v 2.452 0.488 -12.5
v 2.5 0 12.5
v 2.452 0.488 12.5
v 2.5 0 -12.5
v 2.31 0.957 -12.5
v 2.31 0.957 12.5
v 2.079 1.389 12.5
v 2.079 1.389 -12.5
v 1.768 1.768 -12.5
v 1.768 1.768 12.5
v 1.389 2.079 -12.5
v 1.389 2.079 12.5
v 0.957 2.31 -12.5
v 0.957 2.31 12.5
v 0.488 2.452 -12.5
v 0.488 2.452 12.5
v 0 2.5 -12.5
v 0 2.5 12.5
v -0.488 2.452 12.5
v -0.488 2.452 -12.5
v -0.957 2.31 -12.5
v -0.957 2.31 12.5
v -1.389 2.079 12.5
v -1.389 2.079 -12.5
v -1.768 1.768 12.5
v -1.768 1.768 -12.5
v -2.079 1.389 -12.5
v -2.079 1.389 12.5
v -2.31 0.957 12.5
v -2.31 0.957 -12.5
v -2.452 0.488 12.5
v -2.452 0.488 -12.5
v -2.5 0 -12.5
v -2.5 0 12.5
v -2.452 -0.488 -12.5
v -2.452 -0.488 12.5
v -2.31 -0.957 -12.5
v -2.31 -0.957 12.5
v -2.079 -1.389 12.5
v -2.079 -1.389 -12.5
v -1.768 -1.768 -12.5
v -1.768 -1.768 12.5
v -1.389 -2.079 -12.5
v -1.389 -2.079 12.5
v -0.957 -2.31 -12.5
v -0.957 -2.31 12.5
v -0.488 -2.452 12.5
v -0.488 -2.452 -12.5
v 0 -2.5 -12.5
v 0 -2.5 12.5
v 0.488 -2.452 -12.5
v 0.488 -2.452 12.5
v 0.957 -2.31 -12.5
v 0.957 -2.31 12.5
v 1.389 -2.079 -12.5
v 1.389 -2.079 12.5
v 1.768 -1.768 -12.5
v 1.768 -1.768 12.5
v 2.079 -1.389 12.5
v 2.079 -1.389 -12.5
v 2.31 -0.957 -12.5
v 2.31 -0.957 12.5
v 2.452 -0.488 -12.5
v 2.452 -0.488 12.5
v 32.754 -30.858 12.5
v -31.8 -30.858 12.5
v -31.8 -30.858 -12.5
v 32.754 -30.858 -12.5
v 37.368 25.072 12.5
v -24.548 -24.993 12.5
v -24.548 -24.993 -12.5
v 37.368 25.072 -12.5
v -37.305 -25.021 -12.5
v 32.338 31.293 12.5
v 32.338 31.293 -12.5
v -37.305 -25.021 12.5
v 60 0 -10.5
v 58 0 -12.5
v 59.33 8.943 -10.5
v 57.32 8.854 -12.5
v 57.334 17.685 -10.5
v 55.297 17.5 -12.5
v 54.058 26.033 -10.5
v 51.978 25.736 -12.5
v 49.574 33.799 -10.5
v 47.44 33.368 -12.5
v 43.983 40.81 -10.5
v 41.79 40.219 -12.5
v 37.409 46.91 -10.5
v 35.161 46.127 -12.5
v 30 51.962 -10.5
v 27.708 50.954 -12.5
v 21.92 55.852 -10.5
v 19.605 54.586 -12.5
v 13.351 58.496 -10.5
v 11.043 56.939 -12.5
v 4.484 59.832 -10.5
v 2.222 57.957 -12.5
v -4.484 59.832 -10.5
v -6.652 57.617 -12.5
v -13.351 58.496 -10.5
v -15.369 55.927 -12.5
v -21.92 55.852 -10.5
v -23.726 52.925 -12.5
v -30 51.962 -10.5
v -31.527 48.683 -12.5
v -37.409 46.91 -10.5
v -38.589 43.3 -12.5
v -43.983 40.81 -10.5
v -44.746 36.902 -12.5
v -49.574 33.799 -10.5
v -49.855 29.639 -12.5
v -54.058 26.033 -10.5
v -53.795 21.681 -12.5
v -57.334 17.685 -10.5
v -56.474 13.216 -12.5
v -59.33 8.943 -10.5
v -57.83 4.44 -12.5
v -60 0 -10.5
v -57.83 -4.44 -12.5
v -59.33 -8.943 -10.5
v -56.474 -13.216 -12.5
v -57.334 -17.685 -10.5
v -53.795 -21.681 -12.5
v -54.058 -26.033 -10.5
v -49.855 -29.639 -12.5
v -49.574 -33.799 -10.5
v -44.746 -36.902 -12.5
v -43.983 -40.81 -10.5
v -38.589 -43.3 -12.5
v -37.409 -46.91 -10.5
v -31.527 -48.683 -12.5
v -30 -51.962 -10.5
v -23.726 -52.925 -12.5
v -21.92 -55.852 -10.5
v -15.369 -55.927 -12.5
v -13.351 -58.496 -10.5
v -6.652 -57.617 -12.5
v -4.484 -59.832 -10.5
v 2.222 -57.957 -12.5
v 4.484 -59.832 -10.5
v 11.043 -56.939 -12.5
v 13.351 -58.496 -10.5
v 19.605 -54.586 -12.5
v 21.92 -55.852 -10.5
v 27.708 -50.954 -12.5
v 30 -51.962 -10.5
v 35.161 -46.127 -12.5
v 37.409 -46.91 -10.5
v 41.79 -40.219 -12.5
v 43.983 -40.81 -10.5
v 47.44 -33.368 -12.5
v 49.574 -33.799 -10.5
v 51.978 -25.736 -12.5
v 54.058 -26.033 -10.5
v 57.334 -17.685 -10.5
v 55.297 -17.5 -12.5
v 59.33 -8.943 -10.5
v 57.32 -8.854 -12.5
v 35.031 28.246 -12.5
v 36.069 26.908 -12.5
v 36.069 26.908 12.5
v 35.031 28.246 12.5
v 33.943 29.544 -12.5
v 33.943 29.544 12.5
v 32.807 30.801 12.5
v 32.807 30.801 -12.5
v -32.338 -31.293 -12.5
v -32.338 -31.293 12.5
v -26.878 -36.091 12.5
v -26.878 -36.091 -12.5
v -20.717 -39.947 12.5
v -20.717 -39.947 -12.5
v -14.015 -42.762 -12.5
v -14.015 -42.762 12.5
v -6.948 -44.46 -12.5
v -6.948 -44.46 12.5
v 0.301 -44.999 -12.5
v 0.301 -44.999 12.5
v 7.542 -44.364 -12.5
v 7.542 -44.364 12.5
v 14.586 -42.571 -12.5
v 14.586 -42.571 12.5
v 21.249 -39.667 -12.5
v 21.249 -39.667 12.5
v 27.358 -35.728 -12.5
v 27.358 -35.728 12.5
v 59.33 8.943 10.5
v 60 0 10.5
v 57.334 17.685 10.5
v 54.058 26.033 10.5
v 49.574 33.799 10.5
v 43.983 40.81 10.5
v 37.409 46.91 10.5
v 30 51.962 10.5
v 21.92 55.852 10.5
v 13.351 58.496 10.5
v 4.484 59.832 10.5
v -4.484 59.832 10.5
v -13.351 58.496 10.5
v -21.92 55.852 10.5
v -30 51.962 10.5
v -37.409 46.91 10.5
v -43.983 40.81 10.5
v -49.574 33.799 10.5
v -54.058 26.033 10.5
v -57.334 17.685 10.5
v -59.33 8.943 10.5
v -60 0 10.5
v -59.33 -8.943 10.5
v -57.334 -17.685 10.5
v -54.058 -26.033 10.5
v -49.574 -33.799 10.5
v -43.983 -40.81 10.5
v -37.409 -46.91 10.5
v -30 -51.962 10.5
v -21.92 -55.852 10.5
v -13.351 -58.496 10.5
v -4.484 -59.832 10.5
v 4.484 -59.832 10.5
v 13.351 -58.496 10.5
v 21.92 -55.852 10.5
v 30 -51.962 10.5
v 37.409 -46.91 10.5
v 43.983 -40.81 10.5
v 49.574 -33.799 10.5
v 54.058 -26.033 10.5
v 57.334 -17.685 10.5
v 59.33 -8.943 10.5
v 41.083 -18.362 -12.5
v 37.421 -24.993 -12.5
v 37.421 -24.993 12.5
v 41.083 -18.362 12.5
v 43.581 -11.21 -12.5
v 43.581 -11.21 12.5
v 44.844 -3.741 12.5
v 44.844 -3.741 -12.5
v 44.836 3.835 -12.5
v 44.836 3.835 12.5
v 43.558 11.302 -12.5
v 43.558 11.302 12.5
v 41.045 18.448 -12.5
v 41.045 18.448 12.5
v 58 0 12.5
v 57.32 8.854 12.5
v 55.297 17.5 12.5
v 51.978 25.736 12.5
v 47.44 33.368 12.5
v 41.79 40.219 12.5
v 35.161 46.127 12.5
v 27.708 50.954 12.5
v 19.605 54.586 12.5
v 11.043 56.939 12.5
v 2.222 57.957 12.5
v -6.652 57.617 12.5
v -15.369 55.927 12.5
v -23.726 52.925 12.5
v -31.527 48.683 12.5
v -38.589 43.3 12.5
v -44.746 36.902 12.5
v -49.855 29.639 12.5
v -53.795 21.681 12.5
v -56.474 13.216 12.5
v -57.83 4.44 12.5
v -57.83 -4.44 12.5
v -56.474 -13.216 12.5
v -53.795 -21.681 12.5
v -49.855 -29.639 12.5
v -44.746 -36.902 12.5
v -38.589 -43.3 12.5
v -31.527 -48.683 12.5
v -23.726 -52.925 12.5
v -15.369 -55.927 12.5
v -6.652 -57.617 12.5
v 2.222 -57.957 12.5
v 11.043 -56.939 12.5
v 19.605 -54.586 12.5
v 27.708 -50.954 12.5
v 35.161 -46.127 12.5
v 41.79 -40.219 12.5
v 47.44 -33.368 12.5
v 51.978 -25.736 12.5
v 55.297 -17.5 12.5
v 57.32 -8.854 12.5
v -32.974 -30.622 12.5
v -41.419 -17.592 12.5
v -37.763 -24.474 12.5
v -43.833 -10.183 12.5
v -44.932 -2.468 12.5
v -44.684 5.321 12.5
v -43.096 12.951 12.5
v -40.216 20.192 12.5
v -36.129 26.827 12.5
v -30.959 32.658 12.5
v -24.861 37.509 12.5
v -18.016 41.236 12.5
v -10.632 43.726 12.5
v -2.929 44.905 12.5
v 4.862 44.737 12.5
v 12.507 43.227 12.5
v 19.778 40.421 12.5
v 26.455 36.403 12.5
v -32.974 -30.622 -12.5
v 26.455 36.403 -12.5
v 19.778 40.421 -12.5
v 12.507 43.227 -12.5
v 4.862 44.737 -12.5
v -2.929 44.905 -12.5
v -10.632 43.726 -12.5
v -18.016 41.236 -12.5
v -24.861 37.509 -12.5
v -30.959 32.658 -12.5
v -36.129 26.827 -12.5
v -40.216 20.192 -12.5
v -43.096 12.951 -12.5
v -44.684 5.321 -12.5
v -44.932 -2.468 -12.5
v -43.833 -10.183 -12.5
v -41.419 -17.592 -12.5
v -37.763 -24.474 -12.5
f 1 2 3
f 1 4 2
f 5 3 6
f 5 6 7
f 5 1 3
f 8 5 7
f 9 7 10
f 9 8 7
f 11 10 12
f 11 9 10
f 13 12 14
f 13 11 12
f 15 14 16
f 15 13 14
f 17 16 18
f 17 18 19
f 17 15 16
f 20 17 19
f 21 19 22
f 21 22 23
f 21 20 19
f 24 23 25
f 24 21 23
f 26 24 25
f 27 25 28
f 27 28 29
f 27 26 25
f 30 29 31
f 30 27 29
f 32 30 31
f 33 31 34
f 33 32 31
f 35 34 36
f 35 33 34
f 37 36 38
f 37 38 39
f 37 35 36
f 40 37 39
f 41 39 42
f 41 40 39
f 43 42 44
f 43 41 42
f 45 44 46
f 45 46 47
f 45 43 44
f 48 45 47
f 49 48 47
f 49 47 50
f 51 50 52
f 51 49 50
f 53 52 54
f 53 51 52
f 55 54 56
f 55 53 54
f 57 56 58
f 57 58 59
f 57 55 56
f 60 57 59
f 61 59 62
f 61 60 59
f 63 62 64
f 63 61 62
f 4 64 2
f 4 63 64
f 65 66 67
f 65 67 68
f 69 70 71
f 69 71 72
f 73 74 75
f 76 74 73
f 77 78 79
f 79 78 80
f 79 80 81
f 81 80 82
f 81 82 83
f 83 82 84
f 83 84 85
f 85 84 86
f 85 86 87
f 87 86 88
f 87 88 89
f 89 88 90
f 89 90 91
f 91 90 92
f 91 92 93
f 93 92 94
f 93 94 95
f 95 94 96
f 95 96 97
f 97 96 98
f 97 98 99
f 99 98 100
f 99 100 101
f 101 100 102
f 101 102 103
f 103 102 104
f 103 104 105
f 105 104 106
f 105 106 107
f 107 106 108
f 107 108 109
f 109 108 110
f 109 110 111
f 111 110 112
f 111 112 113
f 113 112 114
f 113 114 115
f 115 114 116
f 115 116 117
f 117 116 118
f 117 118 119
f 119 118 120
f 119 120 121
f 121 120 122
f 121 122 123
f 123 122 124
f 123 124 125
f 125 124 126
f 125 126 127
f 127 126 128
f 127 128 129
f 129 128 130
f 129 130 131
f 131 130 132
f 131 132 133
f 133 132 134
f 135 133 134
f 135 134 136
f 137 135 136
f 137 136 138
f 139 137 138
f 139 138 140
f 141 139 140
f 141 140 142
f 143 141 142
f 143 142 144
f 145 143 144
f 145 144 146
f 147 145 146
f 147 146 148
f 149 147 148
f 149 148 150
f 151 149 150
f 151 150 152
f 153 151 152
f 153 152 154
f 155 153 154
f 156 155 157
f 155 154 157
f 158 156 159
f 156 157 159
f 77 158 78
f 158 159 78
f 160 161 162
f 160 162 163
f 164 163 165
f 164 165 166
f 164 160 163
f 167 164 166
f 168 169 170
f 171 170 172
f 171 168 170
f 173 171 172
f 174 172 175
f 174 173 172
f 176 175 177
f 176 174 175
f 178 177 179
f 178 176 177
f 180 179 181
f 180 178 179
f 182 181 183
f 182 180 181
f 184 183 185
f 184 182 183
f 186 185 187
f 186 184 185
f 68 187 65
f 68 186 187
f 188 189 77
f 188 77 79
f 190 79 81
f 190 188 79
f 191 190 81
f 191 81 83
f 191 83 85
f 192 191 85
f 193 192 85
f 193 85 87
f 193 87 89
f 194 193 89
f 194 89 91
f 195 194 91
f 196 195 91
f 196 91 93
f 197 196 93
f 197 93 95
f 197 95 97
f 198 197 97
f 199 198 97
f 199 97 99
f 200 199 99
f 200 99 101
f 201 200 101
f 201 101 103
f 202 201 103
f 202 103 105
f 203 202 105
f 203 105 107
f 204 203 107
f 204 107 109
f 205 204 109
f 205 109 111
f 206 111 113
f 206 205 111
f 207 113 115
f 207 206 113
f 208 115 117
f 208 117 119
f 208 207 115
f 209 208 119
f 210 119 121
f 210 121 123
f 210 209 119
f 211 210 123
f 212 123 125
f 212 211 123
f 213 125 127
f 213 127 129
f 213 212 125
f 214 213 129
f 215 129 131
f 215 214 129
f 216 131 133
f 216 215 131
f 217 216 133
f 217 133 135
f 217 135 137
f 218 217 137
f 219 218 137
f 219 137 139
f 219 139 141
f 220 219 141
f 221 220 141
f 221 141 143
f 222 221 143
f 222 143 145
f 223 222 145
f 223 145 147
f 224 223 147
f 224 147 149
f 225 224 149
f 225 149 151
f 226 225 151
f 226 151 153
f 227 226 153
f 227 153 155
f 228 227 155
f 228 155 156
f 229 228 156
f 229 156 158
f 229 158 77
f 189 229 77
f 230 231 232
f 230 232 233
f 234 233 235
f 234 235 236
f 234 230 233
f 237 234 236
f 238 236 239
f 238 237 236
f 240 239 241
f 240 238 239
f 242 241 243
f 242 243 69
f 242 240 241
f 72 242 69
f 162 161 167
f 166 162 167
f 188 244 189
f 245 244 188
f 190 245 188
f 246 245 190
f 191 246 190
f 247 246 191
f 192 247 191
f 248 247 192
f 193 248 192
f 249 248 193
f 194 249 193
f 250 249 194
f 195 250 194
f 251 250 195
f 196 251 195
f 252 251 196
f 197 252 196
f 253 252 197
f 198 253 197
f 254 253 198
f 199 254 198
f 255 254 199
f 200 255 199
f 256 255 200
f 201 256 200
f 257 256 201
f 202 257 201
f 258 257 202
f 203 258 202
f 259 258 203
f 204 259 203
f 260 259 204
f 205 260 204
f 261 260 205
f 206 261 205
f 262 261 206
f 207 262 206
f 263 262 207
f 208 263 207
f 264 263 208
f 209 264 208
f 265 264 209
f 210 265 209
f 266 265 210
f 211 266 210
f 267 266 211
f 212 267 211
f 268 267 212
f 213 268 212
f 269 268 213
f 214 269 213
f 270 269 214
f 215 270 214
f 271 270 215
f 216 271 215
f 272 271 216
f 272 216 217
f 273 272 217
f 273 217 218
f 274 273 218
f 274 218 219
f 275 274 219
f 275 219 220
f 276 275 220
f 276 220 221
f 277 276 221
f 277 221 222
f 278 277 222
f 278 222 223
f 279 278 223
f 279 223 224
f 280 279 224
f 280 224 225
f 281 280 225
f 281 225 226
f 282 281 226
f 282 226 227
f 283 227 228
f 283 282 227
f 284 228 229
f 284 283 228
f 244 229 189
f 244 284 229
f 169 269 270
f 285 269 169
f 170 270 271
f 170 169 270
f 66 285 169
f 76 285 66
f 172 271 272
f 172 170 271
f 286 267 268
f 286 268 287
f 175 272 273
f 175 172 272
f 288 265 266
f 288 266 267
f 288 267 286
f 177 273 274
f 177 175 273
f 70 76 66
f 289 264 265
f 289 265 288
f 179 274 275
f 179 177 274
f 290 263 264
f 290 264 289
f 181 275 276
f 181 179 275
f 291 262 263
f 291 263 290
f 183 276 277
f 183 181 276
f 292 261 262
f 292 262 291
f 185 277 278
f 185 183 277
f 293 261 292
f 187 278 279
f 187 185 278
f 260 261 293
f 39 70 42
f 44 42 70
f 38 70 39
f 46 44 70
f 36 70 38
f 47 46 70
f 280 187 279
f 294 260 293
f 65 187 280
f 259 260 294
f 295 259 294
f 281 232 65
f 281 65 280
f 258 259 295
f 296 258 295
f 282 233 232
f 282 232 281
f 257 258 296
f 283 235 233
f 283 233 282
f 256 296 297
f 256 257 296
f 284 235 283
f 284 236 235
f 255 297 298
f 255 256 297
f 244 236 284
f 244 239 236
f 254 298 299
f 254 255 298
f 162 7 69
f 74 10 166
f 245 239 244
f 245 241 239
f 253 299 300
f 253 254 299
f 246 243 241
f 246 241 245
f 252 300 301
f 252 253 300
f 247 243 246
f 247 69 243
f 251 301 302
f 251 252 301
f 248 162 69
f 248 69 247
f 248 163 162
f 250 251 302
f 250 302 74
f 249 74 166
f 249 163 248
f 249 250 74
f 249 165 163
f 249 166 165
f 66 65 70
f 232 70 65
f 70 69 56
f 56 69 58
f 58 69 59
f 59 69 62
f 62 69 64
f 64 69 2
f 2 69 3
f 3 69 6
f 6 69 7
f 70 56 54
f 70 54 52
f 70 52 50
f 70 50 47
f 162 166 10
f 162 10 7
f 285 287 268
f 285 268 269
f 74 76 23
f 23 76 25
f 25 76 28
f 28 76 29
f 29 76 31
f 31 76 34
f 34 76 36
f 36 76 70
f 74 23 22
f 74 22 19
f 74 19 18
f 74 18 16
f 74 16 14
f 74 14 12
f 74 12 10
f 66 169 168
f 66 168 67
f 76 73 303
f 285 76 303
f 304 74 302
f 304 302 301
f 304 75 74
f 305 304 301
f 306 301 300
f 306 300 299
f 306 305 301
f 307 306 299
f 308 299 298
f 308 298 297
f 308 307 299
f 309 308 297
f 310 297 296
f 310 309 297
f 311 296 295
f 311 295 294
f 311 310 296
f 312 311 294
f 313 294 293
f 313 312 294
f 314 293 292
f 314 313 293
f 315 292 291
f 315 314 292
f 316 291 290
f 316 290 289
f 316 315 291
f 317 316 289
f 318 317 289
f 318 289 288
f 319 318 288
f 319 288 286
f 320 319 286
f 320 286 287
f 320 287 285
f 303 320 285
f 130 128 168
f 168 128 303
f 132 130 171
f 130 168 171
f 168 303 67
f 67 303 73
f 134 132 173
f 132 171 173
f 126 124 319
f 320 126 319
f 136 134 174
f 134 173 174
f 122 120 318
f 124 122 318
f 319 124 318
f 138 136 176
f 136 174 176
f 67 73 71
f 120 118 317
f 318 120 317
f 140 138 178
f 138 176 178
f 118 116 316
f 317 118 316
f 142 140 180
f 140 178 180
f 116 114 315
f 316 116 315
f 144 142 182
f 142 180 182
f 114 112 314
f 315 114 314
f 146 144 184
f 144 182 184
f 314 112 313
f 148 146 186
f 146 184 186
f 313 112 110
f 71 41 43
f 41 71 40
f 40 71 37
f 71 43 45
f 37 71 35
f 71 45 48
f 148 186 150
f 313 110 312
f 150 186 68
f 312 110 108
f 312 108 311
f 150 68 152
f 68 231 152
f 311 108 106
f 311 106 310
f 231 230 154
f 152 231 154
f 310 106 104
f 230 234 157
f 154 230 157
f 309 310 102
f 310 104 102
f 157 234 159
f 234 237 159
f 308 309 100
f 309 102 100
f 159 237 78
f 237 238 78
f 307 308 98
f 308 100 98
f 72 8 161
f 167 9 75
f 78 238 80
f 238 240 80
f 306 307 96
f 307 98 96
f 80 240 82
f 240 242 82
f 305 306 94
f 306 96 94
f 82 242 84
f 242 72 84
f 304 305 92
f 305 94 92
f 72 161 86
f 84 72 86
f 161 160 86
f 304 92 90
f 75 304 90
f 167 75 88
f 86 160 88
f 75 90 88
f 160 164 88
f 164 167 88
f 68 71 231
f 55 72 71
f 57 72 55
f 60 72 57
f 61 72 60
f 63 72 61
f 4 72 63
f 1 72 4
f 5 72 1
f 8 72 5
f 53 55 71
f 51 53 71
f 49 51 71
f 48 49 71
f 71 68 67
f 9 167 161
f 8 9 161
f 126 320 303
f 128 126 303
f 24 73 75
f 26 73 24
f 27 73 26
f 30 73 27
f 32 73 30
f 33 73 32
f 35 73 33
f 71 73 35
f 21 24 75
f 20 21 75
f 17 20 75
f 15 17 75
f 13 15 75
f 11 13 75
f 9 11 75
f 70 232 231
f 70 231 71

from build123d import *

# Parameters (mm, degrees)
F0_R     = 60
F0_R_2   = 45
F1_DEPTH = 12.5
F2_SIZE  = 2
F3_R     = 2.5
F4_DEPTH = 12.5
F6_DEPTH = 12.5


with BuildPart() as f1:
    # F0 (on Top) → F1 (new body, symmetric)
    with BuildSketch(Plane.XY):
        Circle(F0_R)
        Circle(F0_R_2, mode=Mode.SUBTRACT)
    extrude(amount=F1_DEPTH, both=True)

    # F2
    f2_edges = [f1.edges().sort_by_distance(p)[0] for p in [
        (-60, 0, -12.5),
        (-60, 0, 12.5),
    ]]
    chamfer(f2_edges, length=F2_SIZE)

    # F3 (on Top) → F4 (join, symmetric)
    with BuildSketch(Plane.XY):
        Polygon((37.510756, 25.18704), (32.372119, 31.320056), (-37.304859, -25.020552), (-32.410452, -31.351052), align=None)
        Circle(F3_R, mode=Mode.SUBTRACT)
    extrude(amount=F4_DEPTH, both=True)

    # F5 (on face) → F6 (join, symmetric)
    with BuildSketch(Plane.XY):
        Polygon((38.118351, -24.993353), (-24.714097, -24.993353), (-31.974737, -30.857714), (32.812502, -30.857714), align=None)
    extrude(amount=F6_DEPTH, both=True)


solid = f1.part
